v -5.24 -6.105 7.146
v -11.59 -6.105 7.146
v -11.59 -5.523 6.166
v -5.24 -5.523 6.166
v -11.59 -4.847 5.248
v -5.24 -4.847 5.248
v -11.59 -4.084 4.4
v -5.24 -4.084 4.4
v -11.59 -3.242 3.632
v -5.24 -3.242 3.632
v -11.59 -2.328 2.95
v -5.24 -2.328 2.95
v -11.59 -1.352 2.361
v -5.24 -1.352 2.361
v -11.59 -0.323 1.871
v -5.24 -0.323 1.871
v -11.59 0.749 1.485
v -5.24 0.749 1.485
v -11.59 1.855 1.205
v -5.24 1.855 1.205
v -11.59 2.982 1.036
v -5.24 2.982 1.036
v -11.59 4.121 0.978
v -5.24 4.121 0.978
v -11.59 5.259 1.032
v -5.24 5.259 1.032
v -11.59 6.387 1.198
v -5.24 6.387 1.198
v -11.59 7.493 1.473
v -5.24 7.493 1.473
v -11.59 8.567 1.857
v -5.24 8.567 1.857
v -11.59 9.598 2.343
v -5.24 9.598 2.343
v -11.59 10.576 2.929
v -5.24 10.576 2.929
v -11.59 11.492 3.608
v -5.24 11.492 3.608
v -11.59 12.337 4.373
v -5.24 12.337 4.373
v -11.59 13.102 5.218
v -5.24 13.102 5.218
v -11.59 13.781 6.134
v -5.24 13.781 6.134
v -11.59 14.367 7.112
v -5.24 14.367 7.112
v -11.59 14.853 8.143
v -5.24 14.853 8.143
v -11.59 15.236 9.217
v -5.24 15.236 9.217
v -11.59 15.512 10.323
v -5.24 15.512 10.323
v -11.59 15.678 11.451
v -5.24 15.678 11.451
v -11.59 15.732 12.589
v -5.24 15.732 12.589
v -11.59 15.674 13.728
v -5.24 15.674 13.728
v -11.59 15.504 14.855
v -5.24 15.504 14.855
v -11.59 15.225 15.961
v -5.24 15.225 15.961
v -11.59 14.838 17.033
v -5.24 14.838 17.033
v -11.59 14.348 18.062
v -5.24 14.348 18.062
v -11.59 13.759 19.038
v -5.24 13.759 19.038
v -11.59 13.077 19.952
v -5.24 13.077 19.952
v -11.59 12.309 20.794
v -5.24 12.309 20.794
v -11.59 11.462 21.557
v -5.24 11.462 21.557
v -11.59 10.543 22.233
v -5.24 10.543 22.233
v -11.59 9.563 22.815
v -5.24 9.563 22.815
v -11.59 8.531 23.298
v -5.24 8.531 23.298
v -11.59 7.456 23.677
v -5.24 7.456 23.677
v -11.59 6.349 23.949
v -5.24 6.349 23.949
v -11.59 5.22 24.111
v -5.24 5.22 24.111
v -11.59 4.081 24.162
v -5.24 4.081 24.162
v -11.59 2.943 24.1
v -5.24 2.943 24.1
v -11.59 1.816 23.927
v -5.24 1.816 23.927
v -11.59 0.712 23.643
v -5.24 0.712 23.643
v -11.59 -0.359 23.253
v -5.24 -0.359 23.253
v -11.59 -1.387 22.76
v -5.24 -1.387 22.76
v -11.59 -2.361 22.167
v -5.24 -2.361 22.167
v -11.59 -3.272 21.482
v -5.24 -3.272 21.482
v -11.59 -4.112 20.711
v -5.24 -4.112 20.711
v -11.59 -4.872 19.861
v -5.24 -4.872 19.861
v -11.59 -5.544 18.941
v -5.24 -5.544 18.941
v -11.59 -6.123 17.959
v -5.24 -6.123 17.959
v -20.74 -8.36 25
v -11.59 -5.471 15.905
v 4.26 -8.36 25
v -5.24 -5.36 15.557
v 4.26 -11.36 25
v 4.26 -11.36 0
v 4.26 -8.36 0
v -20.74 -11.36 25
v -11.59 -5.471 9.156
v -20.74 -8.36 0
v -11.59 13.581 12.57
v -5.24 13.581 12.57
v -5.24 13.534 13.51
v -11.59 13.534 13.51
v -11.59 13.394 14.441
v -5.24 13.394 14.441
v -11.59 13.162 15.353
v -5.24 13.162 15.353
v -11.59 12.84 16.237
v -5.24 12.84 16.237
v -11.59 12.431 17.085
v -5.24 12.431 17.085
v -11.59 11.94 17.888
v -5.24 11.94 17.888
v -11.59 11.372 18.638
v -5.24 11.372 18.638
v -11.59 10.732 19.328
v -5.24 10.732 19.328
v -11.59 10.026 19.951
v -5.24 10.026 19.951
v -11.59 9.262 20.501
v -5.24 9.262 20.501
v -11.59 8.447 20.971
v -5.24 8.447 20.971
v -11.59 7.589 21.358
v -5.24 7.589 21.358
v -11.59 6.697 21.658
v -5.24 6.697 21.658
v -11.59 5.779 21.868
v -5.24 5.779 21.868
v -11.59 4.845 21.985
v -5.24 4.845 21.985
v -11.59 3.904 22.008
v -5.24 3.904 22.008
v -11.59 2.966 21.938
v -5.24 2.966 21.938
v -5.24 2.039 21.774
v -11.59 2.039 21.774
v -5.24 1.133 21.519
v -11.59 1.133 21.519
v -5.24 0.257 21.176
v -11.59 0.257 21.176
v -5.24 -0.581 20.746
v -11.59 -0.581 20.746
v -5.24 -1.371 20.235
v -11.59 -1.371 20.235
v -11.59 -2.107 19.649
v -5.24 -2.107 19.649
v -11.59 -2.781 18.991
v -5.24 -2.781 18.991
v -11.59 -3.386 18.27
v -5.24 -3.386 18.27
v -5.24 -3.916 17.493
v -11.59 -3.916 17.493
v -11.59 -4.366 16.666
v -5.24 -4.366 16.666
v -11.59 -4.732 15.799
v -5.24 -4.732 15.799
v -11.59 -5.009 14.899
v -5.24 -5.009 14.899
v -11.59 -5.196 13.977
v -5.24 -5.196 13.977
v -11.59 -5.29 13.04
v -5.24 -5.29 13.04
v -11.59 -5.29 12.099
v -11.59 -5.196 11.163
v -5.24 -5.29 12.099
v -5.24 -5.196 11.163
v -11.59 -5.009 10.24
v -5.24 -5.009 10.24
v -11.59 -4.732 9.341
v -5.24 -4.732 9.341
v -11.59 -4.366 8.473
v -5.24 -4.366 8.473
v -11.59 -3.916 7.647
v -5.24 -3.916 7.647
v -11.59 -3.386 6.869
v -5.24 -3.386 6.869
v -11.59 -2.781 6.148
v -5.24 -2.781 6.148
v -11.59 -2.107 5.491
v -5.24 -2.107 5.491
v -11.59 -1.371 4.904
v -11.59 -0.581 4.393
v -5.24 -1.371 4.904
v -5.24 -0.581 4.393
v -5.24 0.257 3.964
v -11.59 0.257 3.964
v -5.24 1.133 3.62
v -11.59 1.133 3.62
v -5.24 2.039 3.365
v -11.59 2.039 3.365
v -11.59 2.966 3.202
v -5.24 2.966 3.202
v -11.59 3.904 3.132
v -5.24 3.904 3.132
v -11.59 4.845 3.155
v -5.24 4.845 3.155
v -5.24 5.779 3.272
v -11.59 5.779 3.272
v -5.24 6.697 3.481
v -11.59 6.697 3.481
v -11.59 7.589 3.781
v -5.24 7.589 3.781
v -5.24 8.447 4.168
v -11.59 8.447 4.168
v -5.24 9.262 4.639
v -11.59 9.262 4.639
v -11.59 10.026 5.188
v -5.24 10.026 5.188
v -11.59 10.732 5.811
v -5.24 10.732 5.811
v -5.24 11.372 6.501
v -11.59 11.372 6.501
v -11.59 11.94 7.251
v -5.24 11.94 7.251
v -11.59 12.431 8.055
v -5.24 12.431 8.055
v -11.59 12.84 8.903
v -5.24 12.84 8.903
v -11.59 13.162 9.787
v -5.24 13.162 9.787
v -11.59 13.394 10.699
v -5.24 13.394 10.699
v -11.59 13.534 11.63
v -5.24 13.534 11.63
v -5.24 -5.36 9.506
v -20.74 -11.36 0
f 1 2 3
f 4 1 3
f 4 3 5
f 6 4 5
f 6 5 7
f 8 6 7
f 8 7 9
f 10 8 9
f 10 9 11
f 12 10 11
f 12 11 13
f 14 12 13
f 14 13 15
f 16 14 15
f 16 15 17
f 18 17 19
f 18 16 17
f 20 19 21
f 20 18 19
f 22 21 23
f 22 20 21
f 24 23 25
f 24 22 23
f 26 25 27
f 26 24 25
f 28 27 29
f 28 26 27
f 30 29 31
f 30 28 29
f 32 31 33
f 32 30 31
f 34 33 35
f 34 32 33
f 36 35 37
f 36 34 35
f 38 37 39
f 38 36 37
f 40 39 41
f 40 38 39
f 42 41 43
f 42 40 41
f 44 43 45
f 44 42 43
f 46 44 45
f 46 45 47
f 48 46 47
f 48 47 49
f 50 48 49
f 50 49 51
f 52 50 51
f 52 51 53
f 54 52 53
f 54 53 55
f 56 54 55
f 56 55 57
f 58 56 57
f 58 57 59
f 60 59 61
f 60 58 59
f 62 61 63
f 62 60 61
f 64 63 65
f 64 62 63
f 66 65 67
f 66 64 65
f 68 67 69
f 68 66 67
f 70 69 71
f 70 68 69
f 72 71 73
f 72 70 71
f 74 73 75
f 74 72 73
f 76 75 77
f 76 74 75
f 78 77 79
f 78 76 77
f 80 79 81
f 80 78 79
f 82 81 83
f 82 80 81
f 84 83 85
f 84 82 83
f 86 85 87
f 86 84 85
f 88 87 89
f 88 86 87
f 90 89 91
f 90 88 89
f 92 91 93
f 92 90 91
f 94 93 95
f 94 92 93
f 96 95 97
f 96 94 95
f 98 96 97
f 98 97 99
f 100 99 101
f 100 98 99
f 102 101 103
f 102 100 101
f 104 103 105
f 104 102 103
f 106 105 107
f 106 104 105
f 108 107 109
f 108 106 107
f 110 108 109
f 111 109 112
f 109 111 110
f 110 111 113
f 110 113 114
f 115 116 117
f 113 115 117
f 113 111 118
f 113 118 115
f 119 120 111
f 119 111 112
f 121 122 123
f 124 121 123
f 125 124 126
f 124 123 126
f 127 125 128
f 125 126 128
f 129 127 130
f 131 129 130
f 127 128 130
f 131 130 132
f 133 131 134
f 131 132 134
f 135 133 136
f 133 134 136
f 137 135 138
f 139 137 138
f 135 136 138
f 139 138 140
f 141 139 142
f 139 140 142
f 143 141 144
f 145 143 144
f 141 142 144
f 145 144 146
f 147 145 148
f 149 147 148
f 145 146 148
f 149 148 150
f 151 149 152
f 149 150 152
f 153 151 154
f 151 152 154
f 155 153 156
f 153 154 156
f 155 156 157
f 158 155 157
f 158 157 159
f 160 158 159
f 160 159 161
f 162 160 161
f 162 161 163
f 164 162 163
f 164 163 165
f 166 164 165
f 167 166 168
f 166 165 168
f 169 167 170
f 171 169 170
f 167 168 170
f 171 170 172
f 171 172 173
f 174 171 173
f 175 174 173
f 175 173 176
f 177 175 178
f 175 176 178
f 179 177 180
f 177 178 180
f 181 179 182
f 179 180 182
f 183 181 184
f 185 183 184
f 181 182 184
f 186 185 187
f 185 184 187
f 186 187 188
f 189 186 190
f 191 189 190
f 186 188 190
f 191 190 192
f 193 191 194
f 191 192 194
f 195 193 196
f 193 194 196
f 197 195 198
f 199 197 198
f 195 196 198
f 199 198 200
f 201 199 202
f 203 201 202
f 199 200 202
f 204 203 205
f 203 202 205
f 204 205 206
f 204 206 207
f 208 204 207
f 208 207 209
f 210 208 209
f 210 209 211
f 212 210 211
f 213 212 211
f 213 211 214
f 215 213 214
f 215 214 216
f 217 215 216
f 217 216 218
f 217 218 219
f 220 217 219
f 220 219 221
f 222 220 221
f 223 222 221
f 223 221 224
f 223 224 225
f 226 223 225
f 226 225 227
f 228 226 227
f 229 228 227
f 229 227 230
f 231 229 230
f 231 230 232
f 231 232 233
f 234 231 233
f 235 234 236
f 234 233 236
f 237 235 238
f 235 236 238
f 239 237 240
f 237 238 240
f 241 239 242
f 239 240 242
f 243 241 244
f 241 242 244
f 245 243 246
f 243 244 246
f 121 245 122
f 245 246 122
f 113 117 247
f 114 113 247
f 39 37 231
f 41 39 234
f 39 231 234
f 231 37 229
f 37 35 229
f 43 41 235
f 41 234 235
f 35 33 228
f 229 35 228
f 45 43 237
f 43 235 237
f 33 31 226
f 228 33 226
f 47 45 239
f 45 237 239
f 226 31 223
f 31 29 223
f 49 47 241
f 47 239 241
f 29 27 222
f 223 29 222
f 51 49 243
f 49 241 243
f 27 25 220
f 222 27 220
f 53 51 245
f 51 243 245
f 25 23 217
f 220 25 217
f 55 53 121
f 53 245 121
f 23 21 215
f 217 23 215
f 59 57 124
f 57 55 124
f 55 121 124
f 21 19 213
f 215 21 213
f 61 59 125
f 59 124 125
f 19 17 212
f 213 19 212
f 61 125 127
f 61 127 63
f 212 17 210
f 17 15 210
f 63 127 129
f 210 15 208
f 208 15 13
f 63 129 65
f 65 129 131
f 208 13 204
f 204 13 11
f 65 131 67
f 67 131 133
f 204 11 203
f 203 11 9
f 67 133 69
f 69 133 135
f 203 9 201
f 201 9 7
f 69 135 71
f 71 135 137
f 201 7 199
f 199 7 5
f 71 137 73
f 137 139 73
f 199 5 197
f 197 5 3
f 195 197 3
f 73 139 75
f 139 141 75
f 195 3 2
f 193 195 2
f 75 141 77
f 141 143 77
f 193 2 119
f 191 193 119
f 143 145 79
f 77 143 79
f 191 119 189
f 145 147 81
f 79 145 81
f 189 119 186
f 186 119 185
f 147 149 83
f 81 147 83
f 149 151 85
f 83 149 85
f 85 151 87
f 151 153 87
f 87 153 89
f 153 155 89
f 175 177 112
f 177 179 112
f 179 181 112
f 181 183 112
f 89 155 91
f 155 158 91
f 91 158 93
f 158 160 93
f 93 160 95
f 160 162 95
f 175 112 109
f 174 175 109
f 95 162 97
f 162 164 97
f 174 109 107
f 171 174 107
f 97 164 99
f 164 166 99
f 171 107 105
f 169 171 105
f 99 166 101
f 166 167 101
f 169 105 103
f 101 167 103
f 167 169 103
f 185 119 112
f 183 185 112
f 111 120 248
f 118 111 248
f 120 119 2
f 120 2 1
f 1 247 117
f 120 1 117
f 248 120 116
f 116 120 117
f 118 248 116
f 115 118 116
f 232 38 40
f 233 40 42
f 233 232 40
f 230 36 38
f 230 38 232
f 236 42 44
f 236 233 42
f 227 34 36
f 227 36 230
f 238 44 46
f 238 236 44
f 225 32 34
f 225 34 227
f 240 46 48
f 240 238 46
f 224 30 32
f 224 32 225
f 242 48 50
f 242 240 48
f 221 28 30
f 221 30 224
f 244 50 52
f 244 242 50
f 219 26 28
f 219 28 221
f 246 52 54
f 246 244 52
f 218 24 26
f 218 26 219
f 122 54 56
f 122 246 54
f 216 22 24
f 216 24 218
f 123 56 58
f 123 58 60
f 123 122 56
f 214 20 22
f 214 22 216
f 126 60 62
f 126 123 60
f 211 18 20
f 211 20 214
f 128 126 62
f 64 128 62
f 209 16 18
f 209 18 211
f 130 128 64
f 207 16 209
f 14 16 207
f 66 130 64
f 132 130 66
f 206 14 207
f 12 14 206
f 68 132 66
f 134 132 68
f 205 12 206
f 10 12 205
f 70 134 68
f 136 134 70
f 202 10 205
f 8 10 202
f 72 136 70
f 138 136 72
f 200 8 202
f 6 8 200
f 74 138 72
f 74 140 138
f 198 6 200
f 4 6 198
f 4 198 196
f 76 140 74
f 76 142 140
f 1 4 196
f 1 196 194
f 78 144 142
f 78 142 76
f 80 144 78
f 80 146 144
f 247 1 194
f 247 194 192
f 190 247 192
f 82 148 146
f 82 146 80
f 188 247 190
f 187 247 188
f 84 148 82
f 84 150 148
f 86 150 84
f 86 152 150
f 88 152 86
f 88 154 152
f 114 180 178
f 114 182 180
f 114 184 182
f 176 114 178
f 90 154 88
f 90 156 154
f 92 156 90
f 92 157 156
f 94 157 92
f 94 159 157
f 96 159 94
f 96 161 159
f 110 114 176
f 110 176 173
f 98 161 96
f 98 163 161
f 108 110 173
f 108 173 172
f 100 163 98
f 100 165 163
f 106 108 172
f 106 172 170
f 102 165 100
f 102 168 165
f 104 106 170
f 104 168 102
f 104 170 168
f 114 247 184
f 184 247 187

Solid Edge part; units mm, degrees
sketch "Sketch1" plane through (0, 0, 0) normal (0, 0, 1) x (1, 0, 0)
  line L0 (-20.7402, -11.3602) -> (4.2598, -11.3602)
  line L1 (4.2598, -11.3602) -> (4.2598, -8.3602)
  line L2 (4.2598, -8.3602) -> (-5.2402, -5.3602)
  line L3 (-5.2402, -5.3602) -> (-11.2402, -5.3602)
  line L4 (-20.7402, -8.3602) -> (-11.2402, -5.3602)
  line L5 (-20.7402, -8.3602) -> (-20.7402, -11.3602)
extrude "Protrusion1" add sketch "Sketch1" along normal blind 25
sketch "Sketch2" plane through (4.2598, -9.8602, 12.5) normal (1, 0, 0) x (0, 0, -1)
  line L0 (-12.5, 1.5) -> (-3, 4.5181)
  line L1 (-3, 4.5181) -> (2.994, 4.5)
  line L2 (2.994, 4.5) -> (12.5, 1.5)
extrude "Cutout1" cut sketch "Sketch2" against normal through all material side at (4.2598, -6.8035, 20.2651)
sketch "Sketch3" plane through (-5.2402, 0, 0) normal (1, 0, 0) x (0, 1, 0)
  circle A0 centre (4.1398, 12.5698) radius 11.592
  circle A1 centre (4.1398, 12.5698) radius 9.4412
extrude "ExtrudedProtrusion_2" add sketch "Sketch3" against normal blind 6.35
